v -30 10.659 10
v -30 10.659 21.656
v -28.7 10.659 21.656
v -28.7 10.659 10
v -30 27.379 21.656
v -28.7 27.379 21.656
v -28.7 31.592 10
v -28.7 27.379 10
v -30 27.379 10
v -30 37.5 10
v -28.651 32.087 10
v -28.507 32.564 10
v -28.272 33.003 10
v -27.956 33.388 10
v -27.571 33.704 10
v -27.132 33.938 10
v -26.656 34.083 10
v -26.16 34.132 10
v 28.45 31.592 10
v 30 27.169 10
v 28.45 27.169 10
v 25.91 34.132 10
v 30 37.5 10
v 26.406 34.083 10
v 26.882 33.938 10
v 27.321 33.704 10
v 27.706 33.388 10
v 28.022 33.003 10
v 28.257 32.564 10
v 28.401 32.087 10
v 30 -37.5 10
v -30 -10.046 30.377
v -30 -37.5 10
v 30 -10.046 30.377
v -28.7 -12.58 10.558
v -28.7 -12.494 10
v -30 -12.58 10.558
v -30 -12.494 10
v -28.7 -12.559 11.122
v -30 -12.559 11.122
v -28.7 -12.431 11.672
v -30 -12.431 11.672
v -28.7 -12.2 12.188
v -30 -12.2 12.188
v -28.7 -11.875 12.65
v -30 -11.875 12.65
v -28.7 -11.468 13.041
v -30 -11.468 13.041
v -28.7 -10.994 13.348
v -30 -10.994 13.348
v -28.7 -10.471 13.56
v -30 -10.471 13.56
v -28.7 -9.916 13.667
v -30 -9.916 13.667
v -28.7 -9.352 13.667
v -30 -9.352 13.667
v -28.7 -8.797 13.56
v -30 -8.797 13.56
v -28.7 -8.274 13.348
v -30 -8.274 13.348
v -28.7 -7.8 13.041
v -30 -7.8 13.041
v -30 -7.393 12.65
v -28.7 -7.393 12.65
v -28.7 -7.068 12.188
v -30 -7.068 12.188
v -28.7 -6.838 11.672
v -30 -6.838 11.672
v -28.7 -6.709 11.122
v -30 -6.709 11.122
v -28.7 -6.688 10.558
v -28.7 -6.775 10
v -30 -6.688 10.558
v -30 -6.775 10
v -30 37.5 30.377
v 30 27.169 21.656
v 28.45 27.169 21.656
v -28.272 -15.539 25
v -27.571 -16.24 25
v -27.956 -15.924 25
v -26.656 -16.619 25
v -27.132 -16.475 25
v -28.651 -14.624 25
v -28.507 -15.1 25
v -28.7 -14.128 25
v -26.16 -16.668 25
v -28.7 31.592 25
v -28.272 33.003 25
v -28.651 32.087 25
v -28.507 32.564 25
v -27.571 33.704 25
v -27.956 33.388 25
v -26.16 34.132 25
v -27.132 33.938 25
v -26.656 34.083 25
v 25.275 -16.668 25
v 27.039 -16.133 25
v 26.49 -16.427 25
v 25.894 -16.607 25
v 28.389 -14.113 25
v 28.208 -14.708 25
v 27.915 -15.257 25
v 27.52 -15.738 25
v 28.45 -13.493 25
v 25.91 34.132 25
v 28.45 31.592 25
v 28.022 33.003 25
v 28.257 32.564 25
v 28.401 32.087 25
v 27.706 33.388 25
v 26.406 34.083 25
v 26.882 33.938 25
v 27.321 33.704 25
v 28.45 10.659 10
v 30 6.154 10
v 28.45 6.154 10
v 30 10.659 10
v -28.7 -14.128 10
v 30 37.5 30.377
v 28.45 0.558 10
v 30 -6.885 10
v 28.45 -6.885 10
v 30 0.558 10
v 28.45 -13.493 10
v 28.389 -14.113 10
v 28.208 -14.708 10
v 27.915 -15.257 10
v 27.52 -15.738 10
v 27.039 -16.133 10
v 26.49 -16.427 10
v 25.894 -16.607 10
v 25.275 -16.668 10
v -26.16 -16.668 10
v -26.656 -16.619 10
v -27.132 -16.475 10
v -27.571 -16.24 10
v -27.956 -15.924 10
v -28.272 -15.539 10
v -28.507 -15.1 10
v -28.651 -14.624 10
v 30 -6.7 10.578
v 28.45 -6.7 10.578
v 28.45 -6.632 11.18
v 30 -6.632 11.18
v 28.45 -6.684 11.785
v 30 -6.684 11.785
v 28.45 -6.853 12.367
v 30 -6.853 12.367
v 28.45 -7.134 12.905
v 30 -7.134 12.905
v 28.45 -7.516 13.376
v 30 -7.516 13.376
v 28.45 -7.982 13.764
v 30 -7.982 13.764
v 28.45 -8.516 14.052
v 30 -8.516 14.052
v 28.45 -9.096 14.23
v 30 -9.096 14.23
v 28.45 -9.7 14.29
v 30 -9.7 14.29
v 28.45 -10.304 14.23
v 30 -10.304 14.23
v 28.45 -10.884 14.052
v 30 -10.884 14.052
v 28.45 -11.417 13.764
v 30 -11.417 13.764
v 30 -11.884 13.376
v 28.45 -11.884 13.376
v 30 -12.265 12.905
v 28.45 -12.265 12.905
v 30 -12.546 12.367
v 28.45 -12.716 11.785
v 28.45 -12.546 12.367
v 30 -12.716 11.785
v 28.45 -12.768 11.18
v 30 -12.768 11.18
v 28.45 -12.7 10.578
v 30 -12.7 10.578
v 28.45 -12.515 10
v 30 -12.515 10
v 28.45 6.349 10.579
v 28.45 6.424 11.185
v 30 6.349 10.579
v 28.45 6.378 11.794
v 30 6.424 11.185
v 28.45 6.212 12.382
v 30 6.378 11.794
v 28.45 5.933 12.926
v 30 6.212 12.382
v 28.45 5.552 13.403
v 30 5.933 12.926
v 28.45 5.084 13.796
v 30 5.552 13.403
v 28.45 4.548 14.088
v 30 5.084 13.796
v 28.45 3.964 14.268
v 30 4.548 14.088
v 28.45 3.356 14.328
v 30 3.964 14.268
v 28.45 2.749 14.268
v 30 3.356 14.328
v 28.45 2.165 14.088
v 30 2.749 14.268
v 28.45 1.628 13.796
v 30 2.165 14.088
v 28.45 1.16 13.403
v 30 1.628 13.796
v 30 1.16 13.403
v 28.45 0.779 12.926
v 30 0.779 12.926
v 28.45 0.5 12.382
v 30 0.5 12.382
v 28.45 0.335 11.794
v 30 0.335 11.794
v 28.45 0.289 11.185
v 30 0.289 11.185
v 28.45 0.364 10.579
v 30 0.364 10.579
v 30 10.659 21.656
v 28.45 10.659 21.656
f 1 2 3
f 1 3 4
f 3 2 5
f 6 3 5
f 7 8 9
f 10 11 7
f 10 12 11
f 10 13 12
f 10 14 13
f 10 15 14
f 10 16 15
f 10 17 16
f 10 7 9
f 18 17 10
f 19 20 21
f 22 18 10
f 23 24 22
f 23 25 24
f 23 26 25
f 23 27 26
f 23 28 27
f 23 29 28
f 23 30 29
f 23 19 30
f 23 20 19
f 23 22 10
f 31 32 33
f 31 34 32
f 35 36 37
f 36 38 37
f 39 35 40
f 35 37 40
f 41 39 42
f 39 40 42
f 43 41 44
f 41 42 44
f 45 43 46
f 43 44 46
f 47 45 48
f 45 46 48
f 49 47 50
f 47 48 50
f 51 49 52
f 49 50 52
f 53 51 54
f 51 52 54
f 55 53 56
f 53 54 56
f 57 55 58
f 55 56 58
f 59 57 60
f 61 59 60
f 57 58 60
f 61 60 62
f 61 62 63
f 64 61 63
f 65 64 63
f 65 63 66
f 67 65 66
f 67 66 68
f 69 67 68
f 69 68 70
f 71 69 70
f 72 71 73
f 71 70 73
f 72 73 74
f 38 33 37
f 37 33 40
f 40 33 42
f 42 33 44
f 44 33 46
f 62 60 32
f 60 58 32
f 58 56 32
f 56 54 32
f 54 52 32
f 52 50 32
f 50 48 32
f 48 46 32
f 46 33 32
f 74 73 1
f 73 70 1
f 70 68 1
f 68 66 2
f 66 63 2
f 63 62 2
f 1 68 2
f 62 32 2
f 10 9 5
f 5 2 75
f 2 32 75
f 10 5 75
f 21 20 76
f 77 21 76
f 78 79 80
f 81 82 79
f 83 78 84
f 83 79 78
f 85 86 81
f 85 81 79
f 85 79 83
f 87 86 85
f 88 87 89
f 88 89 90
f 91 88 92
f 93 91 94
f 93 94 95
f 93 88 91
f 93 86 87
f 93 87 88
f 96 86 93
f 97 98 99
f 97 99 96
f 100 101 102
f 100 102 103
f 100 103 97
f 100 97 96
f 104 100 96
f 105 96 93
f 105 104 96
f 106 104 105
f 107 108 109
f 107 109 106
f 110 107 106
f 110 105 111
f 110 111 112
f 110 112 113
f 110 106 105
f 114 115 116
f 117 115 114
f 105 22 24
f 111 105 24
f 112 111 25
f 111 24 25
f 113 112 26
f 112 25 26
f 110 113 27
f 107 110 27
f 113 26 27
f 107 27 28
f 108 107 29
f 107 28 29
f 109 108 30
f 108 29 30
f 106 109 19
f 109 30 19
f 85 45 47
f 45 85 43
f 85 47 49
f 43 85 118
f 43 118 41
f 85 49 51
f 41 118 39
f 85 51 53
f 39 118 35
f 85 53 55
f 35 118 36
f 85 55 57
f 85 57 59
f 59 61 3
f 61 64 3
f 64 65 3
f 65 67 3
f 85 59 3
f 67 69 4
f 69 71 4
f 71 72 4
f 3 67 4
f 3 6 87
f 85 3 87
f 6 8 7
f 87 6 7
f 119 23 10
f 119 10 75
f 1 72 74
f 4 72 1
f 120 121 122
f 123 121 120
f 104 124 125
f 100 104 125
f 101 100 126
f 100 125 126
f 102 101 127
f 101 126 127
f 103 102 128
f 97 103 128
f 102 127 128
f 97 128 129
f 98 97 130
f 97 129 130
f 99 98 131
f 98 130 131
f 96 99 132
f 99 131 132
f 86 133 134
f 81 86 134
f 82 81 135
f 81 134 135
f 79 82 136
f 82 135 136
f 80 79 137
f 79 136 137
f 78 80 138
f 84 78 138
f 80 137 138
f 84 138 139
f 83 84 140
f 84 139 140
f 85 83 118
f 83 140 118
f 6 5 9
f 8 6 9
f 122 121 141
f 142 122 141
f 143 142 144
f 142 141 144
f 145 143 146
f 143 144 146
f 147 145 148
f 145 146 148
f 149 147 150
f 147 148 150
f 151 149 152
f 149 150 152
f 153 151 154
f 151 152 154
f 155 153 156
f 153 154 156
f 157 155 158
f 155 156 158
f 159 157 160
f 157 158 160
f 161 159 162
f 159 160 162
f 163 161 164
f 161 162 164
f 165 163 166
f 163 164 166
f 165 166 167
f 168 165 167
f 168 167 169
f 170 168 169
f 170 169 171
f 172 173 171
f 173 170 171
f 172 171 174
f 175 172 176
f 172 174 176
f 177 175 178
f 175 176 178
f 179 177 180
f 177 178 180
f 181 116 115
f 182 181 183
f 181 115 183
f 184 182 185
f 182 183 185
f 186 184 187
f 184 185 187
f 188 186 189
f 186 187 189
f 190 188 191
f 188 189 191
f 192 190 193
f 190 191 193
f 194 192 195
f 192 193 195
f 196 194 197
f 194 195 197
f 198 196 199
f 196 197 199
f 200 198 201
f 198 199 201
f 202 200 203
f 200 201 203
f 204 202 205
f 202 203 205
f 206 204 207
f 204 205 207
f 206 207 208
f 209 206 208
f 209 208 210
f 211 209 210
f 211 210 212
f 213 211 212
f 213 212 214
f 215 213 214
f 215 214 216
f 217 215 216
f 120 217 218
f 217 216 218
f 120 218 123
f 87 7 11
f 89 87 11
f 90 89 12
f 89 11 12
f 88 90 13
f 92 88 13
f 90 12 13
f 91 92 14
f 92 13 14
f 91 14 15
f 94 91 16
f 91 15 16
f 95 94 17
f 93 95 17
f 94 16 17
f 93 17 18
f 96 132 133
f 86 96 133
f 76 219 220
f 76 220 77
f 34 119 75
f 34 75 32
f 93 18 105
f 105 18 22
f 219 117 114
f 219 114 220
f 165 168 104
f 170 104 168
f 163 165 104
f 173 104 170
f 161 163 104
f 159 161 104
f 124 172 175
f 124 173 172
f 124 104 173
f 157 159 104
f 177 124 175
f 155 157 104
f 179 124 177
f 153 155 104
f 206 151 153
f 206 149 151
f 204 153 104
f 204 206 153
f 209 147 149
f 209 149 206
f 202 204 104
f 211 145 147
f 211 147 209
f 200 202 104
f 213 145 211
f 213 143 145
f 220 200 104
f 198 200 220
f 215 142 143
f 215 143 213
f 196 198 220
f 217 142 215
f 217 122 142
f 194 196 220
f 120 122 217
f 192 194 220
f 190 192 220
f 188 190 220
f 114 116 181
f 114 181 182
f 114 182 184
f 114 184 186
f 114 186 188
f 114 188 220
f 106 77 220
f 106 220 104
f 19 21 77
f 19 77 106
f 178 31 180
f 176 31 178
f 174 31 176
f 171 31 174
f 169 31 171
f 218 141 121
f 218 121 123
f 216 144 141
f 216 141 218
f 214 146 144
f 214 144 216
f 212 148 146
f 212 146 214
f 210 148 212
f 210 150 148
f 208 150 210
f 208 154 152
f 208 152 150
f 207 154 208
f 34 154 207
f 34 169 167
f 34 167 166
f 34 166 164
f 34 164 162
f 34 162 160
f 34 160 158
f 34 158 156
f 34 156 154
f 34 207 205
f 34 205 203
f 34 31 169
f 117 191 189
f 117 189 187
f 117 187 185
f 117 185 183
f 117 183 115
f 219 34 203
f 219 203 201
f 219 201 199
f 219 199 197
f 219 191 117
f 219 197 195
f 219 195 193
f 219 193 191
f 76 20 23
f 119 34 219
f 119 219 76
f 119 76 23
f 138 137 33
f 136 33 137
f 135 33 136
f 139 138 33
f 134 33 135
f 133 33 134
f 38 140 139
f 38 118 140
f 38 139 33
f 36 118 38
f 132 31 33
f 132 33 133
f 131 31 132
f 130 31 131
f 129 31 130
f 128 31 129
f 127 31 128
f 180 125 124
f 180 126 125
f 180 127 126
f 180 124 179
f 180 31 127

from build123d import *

# Parameters (mm, degrees)
PAD001_DEPTH    = 30
POCKET002_DEPTH = 15
SKETCH010_R     = 2.951076
SKETCH010_W     = 16.720002
SKETCH010_H     = 13.459998
POCKET003_DEPTH = 5
SKETCH011_R     = 3.068583
SKETCH011_W     = 16.509998
SKETCH011_H     = 13.460002
POCKET004_DEPTH = 5


with BuildPart() as part:
    # Sketch008 → Pad001 (new body, symmetric)
    with BuildSketch(Plane.YZ):
        Polygon((-37.5, 10), (37.5, 10), (37.5, 30.376934), (-10.046035, 30.376934), align=None)
    extrude(amount=PAD001_DEPTH, both=True)

    # Sketch009 (on Face1 of Pad001) → Pocket002 (cut)
    with BuildSketch(Plane.YX.offset(-10)):
        with BuildLine():
            Line((-16.668194, 25.274987), (-16.668194, -26.160018))
            ThreePointArc((-16.668194, -26.160018), (-15.924248, -27.956072), (-14.128194, -28.700018))
            Line((-14.128194, -28.700018), (31.591806, -28.700018))
            ThreePointArc((31.591806, -28.700018), (33.387861, -27.956083), (34.131806, -26.160032))
            Line((34.131806, -26.160032), (34.131806, 25.909982))
            ThreePointArc((34.131806, 25.909982), (33.38786, 27.706037), (31.591806, 28.449982))
            Line((-13.493194, 28.449982), (31.591806, 28.449982))
            ThreePointArc((-13.493194, 28.449982), (-15.738253, 27.520045), (-16.668194, 25.274987))
        make_face()
    extrude(amount=-POCKET002_DEPTH, mode=Mode.SUBTRACT)

    # Sketch010 (on Face3 of Pocket002) → Pocket003 (cut)
    with BuildSketch(Plane(origin=(-30, 0, 0), x_dir=(0, 1, 0), z_dir=(-1, 0, 0))):
        with Locations((-9.634073, -10.729566)):
            Circle(SKETCH010_R)
        with Locations((19.018807, -14.92554)):
            Rectangle(SKETCH010_W, SKETCH010_H)
    extrude(amount=-POCKET003_DEPTH, mode=Mode.SUBTRACT)

    # Sketch011 (on Face14 of Pocket003) → Pocket004 (cut)
    with BuildSketch(Plane.YZ.offset(30)):
        with Locations((3.356387, 11.259916)):
            Circle(SKETCH011_R)
        with Locations((-9.699885, 11.221059)):
            Circle(SKETCH011_R)
        with Locations((18.913807, 14.92554)):
            Rectangle(SKETCH011_W, SKETCH011_H)
    extrude(amount=-POCKET004_DEPTH, mode=Mode.SUBTRACT)


solid = part.part
